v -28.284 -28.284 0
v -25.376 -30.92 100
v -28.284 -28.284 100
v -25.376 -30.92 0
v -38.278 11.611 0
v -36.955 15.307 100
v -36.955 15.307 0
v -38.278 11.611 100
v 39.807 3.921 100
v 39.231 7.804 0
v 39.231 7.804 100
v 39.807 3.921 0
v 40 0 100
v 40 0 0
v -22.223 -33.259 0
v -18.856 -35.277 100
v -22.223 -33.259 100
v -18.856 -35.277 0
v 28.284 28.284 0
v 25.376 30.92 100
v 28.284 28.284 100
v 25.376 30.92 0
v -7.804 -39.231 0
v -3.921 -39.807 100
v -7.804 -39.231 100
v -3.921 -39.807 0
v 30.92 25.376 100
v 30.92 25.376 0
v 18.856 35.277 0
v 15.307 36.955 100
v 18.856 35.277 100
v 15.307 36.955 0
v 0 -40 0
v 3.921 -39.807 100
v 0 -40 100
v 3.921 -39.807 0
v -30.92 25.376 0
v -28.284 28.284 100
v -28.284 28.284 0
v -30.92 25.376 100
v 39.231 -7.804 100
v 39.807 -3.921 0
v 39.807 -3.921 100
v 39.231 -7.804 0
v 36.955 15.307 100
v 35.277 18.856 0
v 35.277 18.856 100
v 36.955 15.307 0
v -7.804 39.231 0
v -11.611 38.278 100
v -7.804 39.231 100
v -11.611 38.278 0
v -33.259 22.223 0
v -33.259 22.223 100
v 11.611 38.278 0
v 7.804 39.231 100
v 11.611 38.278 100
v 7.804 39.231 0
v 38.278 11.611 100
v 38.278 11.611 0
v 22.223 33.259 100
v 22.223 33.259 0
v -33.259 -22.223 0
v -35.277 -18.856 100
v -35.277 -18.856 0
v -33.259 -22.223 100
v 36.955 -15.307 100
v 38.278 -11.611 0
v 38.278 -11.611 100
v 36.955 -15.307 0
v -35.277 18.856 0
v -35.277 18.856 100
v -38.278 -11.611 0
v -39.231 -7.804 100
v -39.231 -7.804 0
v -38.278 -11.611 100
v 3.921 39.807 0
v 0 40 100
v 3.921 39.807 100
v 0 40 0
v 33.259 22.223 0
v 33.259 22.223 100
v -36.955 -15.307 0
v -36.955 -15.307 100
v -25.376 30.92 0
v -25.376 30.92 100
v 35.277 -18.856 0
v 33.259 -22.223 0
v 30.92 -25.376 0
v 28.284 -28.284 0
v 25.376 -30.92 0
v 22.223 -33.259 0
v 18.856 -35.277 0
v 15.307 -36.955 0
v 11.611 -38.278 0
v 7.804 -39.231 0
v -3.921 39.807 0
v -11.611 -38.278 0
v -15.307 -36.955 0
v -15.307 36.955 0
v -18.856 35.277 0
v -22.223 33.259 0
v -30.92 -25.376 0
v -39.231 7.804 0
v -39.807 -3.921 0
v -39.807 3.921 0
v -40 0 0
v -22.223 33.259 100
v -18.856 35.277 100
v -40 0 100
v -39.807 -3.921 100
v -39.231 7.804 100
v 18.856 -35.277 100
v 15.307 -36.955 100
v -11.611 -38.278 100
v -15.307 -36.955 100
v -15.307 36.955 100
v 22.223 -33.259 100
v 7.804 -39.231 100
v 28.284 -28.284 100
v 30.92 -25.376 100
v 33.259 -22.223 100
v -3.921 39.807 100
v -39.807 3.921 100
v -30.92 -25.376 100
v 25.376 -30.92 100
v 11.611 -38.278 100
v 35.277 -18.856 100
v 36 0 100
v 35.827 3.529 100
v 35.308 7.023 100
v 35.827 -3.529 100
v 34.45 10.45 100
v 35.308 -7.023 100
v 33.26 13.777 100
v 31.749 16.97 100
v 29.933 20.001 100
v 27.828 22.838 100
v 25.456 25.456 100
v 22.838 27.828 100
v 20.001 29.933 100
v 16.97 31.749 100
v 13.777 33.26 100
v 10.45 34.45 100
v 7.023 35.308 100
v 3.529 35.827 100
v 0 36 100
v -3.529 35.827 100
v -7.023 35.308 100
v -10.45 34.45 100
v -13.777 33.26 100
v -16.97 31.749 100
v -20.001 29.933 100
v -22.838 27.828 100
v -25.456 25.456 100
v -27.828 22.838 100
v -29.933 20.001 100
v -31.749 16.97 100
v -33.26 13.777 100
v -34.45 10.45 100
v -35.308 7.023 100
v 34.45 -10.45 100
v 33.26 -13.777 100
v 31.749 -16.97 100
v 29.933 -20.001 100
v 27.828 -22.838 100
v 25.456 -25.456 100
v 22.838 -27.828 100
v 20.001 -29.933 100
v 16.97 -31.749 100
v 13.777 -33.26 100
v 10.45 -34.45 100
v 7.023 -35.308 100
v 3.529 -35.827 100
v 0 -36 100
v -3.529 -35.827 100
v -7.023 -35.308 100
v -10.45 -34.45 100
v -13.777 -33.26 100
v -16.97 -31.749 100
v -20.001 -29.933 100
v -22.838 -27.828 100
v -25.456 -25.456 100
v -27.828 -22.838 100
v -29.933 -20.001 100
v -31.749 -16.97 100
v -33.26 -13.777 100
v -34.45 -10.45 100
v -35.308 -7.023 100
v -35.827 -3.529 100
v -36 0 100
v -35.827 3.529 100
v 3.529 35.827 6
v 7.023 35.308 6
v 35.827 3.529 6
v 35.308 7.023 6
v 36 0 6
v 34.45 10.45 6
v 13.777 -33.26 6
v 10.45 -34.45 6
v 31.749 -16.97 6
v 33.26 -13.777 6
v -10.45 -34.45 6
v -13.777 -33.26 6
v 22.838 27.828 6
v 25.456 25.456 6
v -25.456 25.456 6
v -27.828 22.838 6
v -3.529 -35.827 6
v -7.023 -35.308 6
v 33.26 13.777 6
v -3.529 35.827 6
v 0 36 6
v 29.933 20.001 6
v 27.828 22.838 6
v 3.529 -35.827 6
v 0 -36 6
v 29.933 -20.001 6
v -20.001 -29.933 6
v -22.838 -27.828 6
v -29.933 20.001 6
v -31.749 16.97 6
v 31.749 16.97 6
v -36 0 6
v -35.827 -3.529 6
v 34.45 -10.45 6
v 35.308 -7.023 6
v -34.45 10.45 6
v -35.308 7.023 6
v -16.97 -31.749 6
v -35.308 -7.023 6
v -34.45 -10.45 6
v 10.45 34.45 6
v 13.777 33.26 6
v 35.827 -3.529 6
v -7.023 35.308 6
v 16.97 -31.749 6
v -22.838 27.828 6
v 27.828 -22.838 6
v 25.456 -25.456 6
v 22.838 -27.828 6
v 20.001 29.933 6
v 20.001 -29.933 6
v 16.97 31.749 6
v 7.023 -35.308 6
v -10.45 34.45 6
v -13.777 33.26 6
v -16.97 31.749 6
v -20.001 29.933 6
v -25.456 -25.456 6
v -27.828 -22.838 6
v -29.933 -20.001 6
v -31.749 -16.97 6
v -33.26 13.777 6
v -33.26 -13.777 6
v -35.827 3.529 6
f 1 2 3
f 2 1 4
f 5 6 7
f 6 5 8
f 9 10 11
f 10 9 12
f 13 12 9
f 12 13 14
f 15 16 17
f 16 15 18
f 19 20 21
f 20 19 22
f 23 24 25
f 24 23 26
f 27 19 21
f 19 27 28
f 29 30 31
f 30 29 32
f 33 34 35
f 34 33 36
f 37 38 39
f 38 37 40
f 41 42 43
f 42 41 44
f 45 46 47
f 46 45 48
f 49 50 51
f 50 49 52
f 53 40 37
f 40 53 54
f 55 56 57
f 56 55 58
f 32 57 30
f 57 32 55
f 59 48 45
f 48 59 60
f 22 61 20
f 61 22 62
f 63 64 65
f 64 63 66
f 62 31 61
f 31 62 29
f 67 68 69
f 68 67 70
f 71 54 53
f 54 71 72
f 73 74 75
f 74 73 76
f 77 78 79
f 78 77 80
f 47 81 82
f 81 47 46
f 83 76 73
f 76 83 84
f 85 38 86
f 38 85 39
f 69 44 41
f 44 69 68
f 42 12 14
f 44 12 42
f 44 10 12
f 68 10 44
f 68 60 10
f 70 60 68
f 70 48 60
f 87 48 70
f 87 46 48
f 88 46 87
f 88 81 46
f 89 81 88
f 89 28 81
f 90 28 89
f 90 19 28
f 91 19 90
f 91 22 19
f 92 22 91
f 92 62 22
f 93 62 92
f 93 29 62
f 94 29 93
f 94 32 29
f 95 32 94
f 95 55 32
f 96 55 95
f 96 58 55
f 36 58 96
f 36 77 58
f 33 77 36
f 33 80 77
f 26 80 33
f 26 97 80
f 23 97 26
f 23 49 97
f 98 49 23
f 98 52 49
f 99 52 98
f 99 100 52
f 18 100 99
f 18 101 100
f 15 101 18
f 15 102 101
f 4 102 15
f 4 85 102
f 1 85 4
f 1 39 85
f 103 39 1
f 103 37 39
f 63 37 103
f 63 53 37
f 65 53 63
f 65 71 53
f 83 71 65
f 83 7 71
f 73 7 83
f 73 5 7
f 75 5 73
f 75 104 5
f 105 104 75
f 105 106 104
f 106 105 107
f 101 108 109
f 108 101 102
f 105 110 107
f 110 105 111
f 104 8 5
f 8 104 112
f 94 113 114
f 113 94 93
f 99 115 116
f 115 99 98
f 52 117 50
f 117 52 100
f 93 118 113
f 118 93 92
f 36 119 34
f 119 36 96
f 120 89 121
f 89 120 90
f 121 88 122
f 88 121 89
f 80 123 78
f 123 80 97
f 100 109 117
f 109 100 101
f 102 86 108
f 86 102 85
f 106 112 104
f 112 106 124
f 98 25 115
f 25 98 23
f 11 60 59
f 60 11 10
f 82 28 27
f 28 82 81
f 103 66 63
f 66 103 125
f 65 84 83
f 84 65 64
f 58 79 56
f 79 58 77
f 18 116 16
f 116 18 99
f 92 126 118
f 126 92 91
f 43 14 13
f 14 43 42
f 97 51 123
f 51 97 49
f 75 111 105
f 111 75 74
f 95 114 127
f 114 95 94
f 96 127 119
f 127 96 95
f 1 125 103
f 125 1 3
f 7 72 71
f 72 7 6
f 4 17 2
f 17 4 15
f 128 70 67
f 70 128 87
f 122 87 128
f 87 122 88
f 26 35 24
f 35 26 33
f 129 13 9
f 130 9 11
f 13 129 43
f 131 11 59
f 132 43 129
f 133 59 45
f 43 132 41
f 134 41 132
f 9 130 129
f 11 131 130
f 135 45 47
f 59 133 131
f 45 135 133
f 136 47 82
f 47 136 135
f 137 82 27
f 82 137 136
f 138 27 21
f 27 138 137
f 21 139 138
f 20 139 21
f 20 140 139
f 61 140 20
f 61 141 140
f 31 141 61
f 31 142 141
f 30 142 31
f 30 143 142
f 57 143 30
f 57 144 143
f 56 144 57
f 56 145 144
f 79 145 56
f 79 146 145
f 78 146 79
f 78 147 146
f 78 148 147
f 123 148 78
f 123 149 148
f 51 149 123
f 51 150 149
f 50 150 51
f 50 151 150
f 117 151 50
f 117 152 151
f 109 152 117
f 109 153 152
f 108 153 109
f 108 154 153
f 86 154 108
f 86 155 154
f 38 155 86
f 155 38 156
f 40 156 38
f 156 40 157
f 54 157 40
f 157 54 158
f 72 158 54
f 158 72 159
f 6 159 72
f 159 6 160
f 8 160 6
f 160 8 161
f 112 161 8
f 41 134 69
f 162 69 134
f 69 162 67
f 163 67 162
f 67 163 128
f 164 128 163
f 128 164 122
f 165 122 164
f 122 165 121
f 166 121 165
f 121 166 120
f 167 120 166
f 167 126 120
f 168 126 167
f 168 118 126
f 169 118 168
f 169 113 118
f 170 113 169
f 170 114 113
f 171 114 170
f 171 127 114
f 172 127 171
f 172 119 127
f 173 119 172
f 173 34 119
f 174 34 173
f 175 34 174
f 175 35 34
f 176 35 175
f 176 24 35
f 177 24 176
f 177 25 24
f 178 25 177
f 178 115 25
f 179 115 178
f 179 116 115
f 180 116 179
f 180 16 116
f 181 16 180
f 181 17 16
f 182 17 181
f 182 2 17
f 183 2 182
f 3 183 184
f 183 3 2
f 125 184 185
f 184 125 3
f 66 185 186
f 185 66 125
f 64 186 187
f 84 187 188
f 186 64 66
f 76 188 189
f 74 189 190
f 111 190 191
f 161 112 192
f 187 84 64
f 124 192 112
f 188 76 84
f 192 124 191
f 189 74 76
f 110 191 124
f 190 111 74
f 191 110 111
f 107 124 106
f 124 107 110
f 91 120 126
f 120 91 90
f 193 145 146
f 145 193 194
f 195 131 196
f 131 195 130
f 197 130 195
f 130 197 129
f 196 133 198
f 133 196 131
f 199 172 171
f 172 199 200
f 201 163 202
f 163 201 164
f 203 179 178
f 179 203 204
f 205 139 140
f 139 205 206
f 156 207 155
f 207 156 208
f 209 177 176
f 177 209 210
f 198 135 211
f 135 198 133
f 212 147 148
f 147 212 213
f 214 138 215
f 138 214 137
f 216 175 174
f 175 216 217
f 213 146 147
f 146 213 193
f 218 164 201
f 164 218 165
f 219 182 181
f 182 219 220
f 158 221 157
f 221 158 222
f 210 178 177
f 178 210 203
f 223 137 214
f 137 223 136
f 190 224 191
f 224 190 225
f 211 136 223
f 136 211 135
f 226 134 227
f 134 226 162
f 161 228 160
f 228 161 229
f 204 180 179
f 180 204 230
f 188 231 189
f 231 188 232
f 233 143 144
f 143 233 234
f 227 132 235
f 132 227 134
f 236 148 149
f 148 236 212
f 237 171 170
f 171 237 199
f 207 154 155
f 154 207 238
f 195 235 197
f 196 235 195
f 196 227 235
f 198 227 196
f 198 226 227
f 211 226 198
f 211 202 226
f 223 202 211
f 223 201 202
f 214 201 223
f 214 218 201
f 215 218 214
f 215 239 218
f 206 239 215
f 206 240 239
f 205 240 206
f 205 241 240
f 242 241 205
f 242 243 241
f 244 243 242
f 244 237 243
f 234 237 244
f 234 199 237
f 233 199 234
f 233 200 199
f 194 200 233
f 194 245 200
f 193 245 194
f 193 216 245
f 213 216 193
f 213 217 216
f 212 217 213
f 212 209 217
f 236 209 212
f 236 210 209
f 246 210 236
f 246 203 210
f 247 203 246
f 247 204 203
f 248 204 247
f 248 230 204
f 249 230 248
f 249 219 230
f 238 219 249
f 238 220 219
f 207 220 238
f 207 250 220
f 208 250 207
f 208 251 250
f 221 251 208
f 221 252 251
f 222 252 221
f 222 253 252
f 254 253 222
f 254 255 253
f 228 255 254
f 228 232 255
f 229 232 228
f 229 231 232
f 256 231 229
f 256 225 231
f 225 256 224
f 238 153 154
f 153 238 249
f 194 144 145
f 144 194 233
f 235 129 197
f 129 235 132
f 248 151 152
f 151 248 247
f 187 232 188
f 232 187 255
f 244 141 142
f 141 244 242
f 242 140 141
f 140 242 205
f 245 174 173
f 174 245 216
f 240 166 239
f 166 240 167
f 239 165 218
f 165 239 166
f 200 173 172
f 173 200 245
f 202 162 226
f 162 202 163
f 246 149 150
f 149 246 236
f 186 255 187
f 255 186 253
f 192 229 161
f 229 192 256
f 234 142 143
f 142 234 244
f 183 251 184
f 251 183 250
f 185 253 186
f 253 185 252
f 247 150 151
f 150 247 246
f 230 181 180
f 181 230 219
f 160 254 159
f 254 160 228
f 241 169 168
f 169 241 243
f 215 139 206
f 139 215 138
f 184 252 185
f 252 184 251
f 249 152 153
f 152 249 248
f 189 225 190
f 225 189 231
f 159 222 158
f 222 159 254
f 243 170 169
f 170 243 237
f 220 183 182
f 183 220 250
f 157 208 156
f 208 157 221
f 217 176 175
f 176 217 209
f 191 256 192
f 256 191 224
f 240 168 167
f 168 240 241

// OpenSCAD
$fn = 64;

// パラメータ
outer_diameter = 80;
height = 100;
wall_thickness = 4;
bottom_thickness = 6;
handle_protrusion = 12; // 外径方向への飛び出し量 (40mm + 12mm = 52mmの位置まで)

// 内寸の計算
inner_diameter = outer_diameter - (2 * wall_thickness);
inner_height = height - bottom_thickness;

// 取っ手の計算
// 「指を通せる」ためには、カップの表面と取手の内側に隙間が必要です。
// カップの半径 = 40mm
// 取っ手の太さを直径10mm（半径5mm）と設定。
// 取っ手の内側の端をカップ表面から2mm離した位置（42mm）に配置。
handle_thickness = 10;
handle_radius = handle_thickness / 2;
handle_major_r = (outer_diameter / 2) + handle_protrusion - handle_radius;
// 上記の計算で handle_major_r = 40 + 12 - 5 = 47mm となり、
// 取っ手の内側は 47 - 5 = 42mm（カップから2mm離れた位置）にきます。

// 形状の構築
union() {
    // マグカップ本体
    difference() {
        // 外側の円柱
        cylinder(d = outer_diameter, h = height);
        
        // 内側の空間
        translate([0, 0, bottom_thickness])
            cylinder(d = inner_diameter, h = inner_height + 1);
    }

    // 取っ手 (リング状・ループ状)
    // 中心高さに配置
    translate([handle_major_r, 0, height / 2])
    rotate([0, 90, 0])
    rotate_extrude()
    translate([handle_radius, 0, 0])
    circle(r = handle_radius);
}
